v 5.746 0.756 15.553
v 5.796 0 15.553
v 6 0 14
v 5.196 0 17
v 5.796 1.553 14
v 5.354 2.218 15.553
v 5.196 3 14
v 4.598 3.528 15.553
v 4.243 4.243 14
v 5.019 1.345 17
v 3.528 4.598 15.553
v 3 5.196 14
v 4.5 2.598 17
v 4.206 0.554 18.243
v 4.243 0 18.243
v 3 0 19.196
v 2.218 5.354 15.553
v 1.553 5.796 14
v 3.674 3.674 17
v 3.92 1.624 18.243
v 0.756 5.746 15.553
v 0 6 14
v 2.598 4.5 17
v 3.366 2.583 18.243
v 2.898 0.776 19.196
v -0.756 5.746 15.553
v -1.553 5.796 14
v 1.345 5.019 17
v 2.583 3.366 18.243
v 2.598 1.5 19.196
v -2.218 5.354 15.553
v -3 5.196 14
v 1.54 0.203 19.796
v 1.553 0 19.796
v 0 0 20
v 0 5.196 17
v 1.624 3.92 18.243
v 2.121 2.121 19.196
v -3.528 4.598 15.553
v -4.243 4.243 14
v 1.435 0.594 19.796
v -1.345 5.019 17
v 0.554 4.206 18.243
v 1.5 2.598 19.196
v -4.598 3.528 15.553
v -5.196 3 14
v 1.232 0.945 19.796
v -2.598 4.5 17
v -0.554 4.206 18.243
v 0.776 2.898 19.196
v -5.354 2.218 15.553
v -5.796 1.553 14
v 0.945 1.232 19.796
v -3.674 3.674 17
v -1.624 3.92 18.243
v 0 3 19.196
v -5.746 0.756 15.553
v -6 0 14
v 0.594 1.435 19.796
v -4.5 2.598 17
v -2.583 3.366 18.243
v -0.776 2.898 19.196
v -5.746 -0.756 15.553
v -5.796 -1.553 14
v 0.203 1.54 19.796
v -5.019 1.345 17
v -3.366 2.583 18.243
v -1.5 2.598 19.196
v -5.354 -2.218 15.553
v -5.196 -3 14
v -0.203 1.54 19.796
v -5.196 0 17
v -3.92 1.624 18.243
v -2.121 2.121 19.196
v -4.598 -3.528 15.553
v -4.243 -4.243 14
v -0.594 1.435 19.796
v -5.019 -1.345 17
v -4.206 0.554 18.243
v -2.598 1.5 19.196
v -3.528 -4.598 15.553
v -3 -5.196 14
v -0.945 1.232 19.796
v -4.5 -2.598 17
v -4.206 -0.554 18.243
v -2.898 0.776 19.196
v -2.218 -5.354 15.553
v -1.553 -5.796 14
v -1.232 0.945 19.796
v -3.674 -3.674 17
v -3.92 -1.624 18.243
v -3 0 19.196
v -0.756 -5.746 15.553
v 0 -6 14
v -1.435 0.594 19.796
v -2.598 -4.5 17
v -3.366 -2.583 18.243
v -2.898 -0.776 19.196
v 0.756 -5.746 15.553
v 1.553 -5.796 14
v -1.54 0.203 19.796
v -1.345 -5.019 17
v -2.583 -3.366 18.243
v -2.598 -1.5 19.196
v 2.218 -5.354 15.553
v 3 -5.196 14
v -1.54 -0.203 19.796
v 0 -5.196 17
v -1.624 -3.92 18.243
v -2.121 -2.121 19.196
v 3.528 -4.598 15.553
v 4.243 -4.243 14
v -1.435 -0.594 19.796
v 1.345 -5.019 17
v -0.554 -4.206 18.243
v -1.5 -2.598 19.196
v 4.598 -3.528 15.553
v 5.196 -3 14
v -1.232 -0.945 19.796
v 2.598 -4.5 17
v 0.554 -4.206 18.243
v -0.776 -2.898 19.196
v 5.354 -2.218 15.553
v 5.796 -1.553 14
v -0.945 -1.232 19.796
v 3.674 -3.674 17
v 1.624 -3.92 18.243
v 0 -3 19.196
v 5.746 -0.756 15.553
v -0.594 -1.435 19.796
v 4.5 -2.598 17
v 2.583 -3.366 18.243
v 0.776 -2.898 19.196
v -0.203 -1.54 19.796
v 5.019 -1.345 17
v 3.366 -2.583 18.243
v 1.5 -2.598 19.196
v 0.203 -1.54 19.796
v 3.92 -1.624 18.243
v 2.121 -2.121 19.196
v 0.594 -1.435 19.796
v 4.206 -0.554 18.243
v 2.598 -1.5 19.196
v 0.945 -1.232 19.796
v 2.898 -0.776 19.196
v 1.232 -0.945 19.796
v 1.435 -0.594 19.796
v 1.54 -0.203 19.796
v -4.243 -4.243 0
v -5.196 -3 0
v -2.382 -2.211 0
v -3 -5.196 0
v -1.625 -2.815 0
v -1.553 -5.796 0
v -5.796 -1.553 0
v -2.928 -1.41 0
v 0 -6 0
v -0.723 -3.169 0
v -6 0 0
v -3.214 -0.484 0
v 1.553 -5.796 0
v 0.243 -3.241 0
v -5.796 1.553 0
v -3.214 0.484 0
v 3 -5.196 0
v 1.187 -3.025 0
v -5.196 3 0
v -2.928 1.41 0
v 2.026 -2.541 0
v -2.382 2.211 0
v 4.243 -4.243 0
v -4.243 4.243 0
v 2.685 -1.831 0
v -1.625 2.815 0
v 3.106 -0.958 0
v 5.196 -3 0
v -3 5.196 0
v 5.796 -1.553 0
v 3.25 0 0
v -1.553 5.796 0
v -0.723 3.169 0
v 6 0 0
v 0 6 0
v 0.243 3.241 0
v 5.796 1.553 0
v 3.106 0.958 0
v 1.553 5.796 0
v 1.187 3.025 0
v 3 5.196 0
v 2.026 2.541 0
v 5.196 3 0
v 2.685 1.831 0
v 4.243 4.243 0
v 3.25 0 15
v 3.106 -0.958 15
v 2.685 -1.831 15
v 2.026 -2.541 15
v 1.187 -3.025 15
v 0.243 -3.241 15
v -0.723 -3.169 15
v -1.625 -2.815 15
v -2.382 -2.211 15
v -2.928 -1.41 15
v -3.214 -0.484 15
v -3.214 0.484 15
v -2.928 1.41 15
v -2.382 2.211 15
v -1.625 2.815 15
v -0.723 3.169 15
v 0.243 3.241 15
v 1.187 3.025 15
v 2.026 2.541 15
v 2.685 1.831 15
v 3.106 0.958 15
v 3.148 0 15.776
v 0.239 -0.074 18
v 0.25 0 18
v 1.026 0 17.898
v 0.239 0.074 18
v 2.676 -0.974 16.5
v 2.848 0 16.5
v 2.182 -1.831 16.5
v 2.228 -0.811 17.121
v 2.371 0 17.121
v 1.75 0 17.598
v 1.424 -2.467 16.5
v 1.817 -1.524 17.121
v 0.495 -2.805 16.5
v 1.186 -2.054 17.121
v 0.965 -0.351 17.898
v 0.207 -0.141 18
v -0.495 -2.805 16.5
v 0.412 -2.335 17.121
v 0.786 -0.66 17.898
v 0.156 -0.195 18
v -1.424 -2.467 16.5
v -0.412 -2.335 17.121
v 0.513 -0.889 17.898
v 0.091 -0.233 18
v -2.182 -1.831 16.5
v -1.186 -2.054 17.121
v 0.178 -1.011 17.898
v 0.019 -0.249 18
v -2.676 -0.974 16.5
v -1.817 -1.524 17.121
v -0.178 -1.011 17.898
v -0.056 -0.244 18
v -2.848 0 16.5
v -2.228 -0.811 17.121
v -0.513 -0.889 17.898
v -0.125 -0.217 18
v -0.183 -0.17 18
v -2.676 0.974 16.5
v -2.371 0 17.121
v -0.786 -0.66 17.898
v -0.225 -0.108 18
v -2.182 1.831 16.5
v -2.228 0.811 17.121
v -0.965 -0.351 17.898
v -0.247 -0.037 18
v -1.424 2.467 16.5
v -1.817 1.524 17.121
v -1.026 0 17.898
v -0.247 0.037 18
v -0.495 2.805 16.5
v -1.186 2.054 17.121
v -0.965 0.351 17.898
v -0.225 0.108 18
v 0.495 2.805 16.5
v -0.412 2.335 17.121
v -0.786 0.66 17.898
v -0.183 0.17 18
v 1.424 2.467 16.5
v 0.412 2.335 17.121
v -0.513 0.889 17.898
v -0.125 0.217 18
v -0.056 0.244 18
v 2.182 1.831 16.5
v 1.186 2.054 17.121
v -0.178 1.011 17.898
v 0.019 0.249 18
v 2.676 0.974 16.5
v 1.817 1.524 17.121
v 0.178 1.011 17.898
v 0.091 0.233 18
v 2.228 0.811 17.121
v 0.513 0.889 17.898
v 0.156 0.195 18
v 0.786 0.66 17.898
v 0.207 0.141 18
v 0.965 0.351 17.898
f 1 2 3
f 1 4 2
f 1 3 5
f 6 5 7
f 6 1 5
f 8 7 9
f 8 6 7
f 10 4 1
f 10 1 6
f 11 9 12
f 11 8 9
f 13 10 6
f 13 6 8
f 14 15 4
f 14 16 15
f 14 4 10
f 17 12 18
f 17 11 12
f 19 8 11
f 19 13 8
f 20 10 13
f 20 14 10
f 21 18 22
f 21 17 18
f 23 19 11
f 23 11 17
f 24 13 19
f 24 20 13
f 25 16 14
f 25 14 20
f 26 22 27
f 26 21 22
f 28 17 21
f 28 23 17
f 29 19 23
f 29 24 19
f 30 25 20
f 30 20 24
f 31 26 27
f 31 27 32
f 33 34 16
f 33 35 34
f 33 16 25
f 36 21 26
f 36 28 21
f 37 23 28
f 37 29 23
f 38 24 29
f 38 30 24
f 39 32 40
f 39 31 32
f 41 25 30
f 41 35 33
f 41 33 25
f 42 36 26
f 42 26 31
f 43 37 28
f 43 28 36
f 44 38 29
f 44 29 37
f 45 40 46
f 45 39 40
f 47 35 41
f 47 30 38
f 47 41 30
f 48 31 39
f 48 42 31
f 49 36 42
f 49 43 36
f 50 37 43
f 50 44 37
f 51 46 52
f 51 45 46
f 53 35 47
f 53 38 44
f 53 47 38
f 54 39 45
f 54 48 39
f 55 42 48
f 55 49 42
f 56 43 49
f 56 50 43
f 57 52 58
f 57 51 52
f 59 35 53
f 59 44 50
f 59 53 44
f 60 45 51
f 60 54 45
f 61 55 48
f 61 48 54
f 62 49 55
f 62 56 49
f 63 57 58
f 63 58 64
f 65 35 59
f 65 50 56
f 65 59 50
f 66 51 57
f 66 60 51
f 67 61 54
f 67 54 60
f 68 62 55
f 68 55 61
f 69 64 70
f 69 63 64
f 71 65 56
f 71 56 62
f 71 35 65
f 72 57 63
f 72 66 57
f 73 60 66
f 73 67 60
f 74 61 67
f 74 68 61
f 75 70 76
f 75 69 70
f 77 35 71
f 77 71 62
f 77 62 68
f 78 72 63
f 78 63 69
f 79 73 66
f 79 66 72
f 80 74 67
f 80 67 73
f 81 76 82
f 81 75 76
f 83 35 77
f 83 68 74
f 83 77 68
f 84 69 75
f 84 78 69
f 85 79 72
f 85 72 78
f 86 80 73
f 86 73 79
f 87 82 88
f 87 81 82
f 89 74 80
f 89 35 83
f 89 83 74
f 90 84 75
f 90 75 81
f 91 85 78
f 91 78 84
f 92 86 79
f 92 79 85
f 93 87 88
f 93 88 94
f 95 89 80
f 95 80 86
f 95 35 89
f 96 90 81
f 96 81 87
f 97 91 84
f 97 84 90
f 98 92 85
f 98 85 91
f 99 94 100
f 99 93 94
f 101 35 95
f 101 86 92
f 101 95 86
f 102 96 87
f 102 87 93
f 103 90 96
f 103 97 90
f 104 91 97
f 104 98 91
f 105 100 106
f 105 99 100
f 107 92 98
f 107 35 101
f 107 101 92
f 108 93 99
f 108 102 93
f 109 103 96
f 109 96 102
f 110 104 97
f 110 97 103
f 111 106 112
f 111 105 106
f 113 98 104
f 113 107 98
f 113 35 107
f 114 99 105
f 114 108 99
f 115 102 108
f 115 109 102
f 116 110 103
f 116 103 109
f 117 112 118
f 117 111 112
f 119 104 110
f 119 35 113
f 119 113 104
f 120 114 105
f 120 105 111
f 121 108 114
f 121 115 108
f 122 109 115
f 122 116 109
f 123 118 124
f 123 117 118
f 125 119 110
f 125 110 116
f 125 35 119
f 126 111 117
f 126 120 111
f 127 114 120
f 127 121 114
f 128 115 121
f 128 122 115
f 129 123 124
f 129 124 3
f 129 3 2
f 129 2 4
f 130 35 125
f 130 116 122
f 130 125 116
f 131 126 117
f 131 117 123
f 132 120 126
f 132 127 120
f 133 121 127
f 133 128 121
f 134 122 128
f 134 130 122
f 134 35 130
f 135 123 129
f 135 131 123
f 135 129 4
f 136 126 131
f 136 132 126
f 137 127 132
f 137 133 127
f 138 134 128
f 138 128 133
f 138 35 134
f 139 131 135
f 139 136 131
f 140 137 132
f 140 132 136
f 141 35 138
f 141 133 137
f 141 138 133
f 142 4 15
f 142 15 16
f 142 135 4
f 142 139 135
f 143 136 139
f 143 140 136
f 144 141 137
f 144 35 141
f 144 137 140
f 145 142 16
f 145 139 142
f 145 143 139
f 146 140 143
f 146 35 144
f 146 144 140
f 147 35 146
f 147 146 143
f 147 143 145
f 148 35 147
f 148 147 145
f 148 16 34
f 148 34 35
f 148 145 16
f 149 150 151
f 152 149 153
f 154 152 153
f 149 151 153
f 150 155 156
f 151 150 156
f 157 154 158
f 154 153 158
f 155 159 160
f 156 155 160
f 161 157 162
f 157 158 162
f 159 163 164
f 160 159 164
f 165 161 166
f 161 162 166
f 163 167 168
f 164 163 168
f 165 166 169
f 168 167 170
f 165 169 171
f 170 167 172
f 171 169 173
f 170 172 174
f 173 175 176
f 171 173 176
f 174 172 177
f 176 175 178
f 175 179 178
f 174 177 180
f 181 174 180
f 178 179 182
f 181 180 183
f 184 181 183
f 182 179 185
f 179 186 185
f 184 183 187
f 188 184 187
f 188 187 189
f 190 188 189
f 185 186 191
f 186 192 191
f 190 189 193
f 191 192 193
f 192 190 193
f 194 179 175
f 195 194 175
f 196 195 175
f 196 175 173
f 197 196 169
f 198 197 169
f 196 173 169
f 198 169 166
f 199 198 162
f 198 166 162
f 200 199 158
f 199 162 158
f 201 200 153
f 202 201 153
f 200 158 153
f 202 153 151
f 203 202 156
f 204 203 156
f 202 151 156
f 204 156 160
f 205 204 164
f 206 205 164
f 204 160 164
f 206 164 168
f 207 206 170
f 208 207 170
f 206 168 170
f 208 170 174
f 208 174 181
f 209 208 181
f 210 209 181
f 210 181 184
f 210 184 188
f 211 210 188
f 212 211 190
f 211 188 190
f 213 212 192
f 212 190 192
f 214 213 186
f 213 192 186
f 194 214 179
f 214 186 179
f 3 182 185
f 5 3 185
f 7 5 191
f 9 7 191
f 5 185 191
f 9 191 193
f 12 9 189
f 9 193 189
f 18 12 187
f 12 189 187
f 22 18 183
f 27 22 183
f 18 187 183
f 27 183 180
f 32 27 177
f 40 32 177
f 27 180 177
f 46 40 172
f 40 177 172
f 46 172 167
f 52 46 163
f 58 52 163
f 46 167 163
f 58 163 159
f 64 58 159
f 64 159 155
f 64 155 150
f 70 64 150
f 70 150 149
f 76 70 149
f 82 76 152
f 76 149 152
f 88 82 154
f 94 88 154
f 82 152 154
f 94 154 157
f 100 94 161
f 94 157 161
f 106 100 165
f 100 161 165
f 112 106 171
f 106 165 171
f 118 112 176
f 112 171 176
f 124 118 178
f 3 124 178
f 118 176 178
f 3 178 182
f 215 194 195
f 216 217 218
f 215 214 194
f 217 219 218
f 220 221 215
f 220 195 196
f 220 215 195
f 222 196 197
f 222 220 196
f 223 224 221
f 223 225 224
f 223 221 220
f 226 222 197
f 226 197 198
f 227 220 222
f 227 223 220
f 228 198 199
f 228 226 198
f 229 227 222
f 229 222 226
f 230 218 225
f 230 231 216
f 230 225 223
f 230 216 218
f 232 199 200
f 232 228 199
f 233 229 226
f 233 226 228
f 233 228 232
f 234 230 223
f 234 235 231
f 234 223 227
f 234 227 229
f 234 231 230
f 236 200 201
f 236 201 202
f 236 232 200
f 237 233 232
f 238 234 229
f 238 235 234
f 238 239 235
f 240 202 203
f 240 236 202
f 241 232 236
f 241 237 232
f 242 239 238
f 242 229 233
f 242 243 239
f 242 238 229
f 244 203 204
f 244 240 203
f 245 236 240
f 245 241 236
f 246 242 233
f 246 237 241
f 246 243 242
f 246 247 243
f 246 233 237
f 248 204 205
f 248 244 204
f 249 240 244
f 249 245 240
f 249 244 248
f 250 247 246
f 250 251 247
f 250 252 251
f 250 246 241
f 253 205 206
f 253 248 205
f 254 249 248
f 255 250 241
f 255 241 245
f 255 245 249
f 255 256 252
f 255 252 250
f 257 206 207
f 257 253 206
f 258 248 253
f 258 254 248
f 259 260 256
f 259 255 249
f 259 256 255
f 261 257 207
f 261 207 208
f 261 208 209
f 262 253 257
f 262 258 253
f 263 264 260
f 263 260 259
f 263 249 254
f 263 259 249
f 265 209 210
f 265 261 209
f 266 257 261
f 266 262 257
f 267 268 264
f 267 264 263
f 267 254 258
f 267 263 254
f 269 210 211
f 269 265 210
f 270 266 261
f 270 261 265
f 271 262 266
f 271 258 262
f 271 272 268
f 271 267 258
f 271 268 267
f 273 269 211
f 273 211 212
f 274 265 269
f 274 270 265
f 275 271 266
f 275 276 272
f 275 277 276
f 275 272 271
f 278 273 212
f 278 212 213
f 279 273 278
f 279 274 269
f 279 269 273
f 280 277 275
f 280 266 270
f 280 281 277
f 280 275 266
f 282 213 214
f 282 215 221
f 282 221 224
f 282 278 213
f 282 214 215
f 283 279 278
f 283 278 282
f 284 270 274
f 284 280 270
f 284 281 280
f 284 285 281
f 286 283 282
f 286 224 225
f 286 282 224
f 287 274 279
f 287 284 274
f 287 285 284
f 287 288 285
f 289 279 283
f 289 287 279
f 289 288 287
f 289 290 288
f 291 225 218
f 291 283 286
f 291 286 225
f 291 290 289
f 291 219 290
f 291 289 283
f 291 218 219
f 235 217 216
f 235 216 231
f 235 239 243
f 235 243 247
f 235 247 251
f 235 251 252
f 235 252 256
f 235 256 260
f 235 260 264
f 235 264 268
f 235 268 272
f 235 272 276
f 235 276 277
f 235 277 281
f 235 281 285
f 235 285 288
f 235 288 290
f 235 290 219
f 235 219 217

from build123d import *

# Parameters (mm, degrees)
F0_R     = 6
F1_DEPTH = 20
F2_R     = 6
F3_R     = 3.25
F4_DEPTH = 18
F5_R     = 3


with BuildPart() as f1:
    # F0 (on Top) → F1 (new body)
    with BuildSketch(Plane.XY):
        Circle(F0_R)
    extrude(amount=F1_DEPTH)

    # F2
    f2_edges = [f1.edges().sort_by_distance(p)[0] for p in [
        (-6, 0, 20),
    ]]
    fillet(f2_edges, radius=F2_R)

    # F3 (on face) → F4 (cut)
    with BuildSketch(Plane(origin=(0, 0, 0), x_dir=(1, 0, 0), z_dir=(0, 0, -1))):
        Circle(F3_R)
    extrude(amount=-F4_DEPTH, mode=Mode.SUBTRACT)

    # F5
    f5_edges = [f1.edges().sort_by_distance(p)[0] for p in [
        (-3.25, 0, 18),
    ]]
    fillet(f5_edges, radius=F5_R)


solid = f1.part
